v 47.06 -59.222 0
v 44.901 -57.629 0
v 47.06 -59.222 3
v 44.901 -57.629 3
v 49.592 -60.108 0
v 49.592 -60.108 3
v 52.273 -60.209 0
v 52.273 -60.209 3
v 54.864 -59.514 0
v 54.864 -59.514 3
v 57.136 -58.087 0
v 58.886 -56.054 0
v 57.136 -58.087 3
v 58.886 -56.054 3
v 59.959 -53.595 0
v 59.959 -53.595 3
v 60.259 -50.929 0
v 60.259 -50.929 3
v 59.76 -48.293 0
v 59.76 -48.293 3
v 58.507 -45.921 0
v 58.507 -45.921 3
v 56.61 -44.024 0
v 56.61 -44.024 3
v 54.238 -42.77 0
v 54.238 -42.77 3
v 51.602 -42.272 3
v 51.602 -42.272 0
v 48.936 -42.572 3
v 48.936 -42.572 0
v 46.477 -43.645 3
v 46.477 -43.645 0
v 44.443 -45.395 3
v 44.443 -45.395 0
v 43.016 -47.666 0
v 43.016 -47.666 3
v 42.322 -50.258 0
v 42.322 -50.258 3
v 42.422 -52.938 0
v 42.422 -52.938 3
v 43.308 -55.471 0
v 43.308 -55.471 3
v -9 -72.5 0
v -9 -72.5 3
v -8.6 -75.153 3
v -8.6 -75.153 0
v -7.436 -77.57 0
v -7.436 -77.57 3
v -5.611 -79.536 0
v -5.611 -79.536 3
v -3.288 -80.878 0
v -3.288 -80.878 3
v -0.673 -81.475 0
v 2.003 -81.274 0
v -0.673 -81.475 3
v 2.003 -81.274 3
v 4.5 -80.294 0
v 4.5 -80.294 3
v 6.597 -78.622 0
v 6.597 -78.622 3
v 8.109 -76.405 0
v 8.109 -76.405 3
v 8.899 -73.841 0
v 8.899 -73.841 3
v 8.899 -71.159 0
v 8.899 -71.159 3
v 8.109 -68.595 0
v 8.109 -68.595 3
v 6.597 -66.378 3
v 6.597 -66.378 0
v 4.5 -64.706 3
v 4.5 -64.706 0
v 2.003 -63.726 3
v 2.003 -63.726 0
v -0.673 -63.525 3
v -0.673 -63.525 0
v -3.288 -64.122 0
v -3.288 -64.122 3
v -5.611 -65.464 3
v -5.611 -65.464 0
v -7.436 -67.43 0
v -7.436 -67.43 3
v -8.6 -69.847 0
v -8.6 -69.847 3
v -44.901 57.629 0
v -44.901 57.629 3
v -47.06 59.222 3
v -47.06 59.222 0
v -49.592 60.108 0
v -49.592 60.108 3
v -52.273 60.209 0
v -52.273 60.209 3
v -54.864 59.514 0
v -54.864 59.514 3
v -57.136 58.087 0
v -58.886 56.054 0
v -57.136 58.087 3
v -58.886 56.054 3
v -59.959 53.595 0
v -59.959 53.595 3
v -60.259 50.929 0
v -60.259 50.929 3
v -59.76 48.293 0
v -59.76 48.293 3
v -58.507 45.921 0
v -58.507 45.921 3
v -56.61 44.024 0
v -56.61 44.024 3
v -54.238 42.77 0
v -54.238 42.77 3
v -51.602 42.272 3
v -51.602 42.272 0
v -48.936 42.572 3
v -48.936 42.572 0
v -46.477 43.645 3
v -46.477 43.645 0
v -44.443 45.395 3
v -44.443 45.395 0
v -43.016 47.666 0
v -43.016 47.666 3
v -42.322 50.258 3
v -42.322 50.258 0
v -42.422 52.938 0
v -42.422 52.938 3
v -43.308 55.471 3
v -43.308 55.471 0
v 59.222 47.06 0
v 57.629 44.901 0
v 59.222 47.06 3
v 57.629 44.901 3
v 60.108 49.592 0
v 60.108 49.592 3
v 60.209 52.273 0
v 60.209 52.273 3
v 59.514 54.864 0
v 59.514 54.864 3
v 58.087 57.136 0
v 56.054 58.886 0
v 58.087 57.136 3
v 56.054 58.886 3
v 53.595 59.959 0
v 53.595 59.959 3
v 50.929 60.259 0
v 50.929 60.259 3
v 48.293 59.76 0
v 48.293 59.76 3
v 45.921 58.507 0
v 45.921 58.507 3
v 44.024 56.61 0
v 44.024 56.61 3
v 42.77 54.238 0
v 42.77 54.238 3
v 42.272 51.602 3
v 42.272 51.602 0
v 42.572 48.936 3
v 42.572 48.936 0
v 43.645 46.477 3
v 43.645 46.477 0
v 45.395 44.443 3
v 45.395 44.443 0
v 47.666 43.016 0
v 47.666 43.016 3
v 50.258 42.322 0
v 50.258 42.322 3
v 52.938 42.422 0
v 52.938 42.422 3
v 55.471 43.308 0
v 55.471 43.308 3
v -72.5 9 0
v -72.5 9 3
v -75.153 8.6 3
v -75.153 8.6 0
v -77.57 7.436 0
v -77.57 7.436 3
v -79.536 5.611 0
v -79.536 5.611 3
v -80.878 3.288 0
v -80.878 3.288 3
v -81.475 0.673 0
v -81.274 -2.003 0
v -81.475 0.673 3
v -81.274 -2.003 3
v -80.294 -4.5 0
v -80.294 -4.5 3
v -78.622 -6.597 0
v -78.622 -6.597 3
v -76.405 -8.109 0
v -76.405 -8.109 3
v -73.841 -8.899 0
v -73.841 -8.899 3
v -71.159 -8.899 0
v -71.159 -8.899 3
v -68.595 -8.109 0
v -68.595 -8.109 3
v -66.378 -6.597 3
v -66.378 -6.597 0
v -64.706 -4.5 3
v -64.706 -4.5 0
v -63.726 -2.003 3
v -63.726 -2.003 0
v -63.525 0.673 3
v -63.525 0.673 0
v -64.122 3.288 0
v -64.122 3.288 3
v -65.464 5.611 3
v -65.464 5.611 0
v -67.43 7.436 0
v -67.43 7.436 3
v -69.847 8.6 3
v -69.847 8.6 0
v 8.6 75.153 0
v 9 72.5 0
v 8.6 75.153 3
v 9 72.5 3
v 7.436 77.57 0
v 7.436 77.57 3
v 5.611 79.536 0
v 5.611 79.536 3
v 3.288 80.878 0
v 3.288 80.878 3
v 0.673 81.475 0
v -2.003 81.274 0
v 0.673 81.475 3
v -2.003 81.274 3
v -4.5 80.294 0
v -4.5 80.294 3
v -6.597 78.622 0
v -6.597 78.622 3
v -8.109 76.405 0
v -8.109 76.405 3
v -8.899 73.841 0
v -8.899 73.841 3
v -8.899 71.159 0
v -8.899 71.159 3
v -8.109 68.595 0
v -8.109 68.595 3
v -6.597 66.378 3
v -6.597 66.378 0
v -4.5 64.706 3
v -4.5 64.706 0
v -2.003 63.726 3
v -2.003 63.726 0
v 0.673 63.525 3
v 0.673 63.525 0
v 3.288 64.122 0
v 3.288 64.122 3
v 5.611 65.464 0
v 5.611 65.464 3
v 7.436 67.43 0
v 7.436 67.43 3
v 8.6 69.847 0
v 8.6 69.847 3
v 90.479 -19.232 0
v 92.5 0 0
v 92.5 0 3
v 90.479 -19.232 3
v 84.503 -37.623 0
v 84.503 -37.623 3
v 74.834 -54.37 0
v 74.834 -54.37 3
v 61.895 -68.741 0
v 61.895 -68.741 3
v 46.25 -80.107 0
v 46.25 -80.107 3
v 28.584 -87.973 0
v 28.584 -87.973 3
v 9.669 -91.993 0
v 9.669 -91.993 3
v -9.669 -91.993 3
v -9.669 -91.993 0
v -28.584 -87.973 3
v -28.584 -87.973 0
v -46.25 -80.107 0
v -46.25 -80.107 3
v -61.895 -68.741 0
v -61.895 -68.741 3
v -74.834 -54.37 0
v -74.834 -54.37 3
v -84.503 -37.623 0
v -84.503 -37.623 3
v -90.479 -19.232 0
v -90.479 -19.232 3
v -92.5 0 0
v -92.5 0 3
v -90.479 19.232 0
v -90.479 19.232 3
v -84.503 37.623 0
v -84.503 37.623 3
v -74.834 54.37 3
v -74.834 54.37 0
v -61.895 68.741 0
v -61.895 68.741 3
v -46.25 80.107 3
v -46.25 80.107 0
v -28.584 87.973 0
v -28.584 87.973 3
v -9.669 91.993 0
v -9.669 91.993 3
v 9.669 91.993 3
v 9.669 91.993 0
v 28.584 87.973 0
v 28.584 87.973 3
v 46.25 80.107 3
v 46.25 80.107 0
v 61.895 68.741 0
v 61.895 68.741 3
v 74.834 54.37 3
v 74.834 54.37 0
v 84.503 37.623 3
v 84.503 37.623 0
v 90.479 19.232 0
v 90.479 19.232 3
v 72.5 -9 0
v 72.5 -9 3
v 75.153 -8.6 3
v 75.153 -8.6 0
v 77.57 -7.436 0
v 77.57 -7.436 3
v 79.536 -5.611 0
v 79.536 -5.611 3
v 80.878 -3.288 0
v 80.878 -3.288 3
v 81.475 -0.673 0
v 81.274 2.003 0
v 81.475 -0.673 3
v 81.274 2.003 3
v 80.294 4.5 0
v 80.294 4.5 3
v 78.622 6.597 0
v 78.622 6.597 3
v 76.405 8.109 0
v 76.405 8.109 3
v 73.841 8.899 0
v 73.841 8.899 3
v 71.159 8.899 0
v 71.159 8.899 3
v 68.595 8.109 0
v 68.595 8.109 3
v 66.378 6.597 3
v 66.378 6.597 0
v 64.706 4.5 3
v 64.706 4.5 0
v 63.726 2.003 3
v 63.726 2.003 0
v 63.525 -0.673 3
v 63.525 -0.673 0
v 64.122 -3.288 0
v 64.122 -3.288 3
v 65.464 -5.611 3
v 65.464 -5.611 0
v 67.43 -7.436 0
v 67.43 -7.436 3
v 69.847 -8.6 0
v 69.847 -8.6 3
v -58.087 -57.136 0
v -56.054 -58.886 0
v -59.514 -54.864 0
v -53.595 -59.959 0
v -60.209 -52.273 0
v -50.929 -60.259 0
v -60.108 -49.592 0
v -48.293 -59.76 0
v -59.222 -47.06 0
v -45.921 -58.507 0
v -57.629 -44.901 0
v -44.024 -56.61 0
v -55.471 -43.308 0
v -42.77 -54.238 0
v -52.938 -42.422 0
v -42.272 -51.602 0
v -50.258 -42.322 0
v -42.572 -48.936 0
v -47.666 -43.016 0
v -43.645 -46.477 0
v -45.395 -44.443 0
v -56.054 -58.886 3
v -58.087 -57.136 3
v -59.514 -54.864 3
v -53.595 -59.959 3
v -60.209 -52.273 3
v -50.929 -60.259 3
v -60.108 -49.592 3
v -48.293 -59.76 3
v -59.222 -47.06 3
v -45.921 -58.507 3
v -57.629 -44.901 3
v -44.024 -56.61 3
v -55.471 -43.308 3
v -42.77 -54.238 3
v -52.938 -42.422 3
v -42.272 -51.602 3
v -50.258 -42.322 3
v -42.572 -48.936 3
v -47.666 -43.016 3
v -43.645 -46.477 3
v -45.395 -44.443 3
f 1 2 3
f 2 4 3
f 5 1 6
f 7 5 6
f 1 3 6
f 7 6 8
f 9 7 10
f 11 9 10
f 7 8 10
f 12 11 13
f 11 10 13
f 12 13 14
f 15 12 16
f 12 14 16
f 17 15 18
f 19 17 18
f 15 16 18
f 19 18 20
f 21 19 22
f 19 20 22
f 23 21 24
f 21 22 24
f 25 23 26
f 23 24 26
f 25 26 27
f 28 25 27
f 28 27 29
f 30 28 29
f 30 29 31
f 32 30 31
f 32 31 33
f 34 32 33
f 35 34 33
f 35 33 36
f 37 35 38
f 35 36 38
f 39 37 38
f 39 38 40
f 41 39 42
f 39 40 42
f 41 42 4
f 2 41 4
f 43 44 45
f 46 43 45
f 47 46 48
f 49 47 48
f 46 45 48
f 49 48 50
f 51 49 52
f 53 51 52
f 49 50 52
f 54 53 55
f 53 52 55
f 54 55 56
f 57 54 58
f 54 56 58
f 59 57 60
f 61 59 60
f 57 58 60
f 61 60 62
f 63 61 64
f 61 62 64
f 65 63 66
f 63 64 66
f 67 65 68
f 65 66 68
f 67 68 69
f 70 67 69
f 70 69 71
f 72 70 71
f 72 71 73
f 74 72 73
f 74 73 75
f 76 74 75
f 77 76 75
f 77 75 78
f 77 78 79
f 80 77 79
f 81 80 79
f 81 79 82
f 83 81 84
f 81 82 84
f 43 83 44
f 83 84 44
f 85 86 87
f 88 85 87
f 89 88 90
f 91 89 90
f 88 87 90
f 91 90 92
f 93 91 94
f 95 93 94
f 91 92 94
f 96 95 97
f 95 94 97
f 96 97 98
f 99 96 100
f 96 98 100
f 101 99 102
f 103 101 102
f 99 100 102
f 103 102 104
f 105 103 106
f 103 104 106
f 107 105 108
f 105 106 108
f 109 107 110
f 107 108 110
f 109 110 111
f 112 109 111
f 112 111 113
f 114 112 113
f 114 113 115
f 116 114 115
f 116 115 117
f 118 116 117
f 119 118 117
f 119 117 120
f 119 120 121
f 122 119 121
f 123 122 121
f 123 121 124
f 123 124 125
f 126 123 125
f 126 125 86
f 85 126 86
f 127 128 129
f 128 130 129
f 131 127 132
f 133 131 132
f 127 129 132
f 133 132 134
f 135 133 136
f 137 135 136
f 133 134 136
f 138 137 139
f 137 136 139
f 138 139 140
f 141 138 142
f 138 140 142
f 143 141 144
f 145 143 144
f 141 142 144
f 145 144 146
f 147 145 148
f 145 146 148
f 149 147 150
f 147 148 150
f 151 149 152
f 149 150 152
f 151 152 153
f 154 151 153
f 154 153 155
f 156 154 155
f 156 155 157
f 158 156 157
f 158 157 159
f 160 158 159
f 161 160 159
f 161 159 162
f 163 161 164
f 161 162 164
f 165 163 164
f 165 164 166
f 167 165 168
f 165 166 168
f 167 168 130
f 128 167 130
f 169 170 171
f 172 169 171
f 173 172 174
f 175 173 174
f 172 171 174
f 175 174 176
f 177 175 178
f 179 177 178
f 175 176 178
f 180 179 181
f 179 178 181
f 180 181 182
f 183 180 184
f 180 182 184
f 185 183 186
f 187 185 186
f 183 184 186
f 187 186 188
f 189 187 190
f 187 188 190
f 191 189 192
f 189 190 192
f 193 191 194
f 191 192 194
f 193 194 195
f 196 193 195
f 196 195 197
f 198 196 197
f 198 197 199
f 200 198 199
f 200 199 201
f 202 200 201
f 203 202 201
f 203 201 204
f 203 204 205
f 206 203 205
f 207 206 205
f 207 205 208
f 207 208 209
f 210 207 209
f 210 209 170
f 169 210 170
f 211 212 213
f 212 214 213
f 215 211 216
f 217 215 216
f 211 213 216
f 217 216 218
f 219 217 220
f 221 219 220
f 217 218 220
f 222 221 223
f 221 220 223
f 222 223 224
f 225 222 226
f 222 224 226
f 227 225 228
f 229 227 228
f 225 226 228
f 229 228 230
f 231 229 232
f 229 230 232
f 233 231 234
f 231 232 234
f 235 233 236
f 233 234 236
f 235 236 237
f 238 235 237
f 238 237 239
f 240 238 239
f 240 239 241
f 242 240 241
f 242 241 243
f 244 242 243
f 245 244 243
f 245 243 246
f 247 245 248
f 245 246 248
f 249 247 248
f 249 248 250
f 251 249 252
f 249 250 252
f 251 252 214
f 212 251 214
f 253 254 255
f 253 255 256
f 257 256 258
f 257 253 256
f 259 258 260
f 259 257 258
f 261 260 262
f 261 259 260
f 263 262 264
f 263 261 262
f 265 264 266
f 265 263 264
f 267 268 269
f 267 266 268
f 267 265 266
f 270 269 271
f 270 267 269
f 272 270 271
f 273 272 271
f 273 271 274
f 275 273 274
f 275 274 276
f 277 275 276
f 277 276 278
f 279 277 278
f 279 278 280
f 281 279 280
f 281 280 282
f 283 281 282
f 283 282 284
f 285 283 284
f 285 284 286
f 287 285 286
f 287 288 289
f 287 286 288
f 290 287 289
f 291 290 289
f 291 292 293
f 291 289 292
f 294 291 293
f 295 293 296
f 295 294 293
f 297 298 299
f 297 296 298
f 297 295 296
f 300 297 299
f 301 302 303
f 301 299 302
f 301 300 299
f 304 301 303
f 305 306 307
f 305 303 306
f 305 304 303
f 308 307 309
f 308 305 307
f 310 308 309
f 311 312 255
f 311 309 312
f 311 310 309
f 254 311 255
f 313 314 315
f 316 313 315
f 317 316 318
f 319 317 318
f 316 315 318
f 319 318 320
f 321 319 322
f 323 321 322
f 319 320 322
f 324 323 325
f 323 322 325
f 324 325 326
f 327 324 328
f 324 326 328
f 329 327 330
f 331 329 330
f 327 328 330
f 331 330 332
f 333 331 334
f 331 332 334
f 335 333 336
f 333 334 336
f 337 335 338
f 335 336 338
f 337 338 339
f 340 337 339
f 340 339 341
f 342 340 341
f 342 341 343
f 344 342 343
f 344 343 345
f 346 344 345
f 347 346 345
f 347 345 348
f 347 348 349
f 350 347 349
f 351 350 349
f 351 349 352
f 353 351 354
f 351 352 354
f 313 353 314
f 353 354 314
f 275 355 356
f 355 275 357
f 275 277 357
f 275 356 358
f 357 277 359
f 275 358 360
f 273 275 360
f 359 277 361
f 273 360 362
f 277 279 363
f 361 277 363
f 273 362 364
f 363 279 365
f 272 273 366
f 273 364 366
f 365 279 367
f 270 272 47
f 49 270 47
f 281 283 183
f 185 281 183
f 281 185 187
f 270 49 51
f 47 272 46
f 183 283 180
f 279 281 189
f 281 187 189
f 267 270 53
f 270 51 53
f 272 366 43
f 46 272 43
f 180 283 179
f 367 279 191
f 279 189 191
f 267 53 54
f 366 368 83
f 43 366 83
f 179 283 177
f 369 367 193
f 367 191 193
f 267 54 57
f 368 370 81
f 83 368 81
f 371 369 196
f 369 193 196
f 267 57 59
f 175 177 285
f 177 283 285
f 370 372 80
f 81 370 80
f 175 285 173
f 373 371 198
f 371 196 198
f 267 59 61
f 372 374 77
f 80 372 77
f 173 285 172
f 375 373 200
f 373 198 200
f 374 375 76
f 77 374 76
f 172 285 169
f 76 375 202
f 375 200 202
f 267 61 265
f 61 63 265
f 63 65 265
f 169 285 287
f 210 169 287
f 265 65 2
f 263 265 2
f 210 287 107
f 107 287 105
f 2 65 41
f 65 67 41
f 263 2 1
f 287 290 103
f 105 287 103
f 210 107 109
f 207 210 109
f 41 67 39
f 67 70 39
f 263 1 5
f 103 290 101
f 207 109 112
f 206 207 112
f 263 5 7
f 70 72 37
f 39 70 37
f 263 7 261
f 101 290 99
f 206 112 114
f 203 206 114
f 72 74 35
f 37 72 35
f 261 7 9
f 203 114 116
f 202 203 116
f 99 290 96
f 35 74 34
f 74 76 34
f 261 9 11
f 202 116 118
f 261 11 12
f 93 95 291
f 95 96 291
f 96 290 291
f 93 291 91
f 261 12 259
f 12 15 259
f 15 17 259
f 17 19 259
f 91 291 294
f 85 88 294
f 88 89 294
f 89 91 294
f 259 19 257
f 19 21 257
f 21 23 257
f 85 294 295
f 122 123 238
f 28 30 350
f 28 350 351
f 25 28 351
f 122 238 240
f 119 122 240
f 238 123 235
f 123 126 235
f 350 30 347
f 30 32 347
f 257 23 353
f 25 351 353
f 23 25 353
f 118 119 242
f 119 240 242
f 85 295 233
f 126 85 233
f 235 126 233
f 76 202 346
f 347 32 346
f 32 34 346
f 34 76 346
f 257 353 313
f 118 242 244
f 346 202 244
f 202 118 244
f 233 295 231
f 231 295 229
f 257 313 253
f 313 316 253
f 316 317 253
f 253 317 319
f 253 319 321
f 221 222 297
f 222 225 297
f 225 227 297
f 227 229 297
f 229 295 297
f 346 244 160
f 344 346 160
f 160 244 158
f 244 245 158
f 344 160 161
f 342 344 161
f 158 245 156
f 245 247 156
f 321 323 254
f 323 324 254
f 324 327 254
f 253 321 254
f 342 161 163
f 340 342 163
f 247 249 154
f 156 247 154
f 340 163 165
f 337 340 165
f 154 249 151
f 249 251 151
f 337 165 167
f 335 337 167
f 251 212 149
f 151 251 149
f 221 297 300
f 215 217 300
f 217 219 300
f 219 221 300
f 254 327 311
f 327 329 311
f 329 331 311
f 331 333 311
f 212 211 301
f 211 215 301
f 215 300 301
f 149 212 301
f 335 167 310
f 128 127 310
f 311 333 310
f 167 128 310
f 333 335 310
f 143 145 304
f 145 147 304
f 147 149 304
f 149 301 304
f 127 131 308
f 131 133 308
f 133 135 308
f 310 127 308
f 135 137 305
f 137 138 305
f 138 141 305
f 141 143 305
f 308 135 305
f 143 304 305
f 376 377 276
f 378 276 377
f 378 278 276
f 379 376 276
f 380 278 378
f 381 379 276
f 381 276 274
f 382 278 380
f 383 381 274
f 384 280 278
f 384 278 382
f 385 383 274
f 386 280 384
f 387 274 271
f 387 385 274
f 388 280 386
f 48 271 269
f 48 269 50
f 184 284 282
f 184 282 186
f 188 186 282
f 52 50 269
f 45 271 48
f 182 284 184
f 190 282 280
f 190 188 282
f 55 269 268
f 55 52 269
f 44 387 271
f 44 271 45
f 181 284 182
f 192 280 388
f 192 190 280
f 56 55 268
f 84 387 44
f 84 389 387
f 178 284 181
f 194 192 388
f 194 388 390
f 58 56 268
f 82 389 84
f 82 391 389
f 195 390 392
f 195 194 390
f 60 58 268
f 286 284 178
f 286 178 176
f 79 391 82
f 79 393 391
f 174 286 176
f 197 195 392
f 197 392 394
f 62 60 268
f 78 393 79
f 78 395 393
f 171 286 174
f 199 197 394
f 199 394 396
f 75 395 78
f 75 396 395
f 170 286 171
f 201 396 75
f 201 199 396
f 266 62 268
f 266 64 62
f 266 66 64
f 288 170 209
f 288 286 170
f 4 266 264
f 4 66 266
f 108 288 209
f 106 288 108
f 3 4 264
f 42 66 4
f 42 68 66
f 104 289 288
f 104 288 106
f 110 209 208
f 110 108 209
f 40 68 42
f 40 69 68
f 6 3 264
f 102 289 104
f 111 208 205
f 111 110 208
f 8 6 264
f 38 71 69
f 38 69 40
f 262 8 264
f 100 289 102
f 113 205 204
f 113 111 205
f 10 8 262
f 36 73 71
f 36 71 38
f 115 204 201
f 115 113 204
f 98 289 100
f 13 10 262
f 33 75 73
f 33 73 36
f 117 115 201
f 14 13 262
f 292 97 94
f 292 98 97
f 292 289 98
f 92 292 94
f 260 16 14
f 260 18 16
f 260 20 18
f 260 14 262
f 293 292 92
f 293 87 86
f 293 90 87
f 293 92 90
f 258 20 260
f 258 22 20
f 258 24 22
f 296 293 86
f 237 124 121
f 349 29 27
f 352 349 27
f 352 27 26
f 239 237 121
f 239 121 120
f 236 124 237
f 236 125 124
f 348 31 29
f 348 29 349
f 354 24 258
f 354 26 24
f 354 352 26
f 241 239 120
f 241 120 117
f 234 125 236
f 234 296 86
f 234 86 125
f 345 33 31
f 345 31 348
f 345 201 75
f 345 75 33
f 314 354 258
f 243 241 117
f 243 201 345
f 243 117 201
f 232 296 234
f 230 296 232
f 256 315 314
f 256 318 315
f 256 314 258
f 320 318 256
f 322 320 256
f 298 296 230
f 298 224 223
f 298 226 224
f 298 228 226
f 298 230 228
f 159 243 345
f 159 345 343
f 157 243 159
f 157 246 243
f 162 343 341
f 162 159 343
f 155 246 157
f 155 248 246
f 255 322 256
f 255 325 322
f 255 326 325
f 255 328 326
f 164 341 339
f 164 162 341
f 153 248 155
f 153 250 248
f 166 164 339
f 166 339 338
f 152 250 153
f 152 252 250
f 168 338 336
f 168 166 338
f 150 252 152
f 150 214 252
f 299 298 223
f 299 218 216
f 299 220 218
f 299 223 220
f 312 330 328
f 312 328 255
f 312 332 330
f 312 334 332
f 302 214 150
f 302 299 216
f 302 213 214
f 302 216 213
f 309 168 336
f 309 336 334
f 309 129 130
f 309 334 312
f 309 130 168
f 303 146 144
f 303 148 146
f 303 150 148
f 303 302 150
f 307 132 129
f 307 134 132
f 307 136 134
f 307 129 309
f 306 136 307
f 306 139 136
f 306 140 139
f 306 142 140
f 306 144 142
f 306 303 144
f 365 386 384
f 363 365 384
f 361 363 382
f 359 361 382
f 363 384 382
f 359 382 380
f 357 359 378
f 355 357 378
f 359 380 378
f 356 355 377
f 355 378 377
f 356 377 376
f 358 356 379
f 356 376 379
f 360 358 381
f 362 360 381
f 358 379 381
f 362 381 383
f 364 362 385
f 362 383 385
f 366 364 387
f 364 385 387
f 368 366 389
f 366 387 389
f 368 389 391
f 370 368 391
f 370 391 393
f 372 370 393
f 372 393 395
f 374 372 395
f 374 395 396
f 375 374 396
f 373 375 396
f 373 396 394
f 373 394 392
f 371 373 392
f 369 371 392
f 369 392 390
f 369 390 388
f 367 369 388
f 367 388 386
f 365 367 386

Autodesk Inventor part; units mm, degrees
ref_plane "YZ Plane" through (0, 0, 0) normal (1, 0, 0) x (0, 1, 0)
ref_plane "XZ Plane" through (0, 0, 0) normal (0, 1, 0) x (-1, 0, 0)
ref_plane "XY Plane" through (0, 0, 0) normal (0, 0, 1) x (1, 0, 0)
sketch "Sketch1" plane through (0, 0, 0) normal (0, 0, 1) x (1, 0, 0)
  circle A0 centre (0, 0) radius 92.5
  dimension "d22" = 185
extrude "Plate1" add sketch "Sketch1" along normal blind 3
sketch "Sketch5" plane through (0, 0, 3) normal (0, 0, 1) x (1, 0, 0)
  circle A0 centre (0, 0) radius 92.5 projected
  circle A1 centre (0, 72.5) radius 9
  circle A2 centre (0, 0) radius 72.5 construction
  dimension "d23" = 18
  dimension "d30" = 20
extrude "Cut1" cut sketch "Sketch5" against normal blind 3 contours A1
pattern_circular "Circular Pattern1" count 8 over 360 about axis through (0, 0, 0) along (0, 0, 1) of "Cut1"
equation "\"d25\" = Thickness"
equation "\"d2\" = Thickness"
equation "\"BendReliefWidth\" = Thickness"
equation "\"BendReliefDepth\" = 0.5 * Thickness"
equation "\"CornerReliefSize\" = 4 * Thickness"
equation "\"MinimumRemnant\" = 2 * Thickness"
equation "\"TransitionRadius\" = BendRadius"
equation "\"JacobiRadiusSize\" = BendRadius"
equation "\"GapSize\" = Thickness"
equation "\"Thickness\" = 3"
equation "\"BendRadius\" = 5"
properties part number "MSC 921 plug 76" material "Stainless Steel"
